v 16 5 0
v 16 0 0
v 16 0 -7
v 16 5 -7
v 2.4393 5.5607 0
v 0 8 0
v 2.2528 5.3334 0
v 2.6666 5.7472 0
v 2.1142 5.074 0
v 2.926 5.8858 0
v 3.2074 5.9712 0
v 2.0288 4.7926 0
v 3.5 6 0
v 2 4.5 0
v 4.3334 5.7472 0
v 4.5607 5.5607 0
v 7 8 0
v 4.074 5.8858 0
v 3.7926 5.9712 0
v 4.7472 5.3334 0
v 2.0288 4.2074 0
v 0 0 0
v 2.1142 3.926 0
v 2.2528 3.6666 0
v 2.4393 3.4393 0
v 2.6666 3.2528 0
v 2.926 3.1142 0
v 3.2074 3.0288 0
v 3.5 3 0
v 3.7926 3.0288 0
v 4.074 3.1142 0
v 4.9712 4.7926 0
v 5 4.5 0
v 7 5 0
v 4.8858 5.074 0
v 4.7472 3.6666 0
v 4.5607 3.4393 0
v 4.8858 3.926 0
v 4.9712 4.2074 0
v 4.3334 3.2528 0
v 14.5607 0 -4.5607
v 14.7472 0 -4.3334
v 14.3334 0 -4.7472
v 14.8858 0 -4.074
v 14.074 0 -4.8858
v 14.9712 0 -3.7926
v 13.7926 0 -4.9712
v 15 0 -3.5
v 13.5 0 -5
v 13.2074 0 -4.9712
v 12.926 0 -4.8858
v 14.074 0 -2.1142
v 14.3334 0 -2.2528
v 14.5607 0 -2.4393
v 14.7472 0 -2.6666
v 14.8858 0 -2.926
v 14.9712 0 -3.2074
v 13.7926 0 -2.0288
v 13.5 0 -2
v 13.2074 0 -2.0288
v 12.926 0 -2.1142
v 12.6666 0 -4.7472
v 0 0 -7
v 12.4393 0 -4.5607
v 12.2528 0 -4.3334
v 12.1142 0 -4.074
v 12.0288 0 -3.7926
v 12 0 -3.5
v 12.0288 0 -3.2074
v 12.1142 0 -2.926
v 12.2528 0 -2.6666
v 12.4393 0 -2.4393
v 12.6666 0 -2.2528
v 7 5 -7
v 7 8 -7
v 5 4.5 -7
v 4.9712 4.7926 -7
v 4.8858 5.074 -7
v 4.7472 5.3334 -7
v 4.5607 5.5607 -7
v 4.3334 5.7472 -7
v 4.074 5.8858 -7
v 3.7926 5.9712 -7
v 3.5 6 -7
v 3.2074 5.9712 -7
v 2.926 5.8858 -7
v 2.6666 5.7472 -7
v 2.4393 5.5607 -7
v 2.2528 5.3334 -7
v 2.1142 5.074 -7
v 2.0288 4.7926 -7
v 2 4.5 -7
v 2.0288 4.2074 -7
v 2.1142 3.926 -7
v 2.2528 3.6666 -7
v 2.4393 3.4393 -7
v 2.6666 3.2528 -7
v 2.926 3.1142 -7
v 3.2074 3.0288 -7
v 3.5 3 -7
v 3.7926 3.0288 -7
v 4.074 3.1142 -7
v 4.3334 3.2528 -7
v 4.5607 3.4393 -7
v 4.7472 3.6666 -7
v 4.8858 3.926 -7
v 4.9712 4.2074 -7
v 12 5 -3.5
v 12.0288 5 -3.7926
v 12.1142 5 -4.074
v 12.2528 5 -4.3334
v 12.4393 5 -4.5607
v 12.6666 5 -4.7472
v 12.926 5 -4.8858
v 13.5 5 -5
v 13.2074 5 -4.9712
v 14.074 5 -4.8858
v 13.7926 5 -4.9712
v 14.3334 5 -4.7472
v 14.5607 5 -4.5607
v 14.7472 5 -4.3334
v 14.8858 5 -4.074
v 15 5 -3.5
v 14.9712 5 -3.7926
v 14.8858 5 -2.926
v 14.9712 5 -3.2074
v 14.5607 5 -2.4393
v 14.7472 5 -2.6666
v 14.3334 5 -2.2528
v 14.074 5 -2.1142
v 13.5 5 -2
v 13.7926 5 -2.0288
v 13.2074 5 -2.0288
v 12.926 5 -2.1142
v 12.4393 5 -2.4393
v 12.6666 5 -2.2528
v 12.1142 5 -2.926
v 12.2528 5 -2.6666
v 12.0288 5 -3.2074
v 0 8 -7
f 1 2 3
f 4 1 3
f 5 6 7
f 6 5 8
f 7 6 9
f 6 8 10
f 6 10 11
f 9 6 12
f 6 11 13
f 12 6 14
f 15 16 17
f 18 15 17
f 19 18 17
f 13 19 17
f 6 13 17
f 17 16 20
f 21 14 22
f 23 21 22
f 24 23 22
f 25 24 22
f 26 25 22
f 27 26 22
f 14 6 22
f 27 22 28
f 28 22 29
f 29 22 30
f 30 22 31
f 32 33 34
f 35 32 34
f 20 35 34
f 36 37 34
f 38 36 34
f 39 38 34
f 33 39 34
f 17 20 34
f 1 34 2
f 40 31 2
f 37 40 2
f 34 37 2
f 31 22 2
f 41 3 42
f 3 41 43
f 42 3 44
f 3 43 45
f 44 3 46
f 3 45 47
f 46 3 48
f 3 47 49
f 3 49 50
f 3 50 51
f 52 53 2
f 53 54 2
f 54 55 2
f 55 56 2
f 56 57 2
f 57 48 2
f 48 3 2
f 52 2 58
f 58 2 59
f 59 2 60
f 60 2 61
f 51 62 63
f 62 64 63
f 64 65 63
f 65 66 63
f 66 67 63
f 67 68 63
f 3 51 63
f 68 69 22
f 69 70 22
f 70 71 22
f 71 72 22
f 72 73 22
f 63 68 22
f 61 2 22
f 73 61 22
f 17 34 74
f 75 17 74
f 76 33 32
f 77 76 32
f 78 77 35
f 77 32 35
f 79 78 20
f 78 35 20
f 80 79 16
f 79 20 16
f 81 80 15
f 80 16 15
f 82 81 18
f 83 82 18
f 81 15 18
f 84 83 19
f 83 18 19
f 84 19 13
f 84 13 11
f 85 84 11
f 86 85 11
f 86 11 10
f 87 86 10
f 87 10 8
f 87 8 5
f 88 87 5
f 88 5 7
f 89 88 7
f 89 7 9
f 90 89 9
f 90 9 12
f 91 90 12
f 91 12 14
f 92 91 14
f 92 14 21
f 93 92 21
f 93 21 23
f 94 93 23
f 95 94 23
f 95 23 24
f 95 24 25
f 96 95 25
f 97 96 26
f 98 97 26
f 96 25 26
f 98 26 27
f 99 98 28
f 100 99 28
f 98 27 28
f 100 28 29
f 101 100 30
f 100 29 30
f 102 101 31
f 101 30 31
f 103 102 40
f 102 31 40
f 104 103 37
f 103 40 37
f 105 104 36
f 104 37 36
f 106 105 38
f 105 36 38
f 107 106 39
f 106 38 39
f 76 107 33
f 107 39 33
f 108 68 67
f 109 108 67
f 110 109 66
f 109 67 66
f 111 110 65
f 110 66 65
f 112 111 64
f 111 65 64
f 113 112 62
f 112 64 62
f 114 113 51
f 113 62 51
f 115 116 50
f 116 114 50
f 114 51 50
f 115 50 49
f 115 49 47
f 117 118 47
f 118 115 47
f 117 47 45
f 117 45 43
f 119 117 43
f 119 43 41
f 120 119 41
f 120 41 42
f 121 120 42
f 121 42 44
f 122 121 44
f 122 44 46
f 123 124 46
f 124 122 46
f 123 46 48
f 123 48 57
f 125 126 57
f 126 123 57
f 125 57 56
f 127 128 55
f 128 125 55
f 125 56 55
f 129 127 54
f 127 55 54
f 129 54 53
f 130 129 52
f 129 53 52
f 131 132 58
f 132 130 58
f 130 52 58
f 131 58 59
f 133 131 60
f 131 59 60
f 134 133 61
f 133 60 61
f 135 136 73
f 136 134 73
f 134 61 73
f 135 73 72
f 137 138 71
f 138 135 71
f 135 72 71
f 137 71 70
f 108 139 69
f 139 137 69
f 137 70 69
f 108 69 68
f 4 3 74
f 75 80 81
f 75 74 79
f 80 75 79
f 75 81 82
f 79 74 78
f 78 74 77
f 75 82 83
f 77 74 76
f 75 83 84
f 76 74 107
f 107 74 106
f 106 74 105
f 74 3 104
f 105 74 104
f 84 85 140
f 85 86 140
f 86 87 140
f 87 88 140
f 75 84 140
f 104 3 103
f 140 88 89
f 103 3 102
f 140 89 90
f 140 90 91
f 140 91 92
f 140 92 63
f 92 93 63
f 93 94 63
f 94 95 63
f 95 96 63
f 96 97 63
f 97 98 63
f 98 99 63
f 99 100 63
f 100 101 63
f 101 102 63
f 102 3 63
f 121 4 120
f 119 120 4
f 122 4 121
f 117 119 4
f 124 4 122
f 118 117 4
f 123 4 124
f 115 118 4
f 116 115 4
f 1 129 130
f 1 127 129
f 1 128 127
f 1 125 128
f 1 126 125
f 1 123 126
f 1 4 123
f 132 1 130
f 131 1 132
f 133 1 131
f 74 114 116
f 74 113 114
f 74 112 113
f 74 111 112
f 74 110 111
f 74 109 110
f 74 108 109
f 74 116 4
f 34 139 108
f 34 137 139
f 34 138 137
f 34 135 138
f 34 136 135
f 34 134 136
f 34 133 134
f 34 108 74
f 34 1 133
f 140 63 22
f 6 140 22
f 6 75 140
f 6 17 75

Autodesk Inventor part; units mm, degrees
ref_plane "YZ Plane" through (0, 0, 0) normal (1, 0, 0) x (0, 1, 0)
ref_plane "XZ Plane" through (0, 0, 0) normal (0, 1, 0) x (-1, 0, 0)
ref_plane "XY Plane" through (0, 0, 0) normal (0, 0, 1) x (1, 0, 0)
sketch "Эскиз1" plane through (0, 0, 0) normal (0, 1, 0) x (-1, 0, 0)
  line L0 (0, 0) -> (-16, 0)
  line L1 (-16, 0) -> (-16, -7)
  line L2 (-16, -7) -> (0, -7)
  line L3 (0, -7) -> (0, 0)
  circle A0 centre (-13.5, -3.5) radius 1.5
  dimension "d0" = 16
  dimension "d1" = 7
  dimension "d2" = 3
  dimension "d3" = 2.5
  dimension "d4" = 3.5
extrude "Выдавливание1" add sketch "Эскиз1" along normal blind 5
sketch "Эскиз2" plane through (0, 0, 0) normal (0, 1, 0) x (-1, 0, 0)
  line L0 (-16, 0) -> (-16, -7) construction
  line L1 (-16, -7) -> (0, -7) construction
  line L2 (0, -7) -> (0, 0) projected
  line L3 (0, 0) -> (-16, 0) construction
  circle A0 centre (-13.5, -3.5) radius 1.5 construction
  line L4 (0, 0) -> (-7, 0)
  line L5 (-7, 0) -> (-7, -7)
  line L6 (-7, -7) -> (0, -7)
  line L7 (0, -7) -> (0, 0)
  point P0 (0, -7)
  dimension "d7" = 7
  dimension "d8" = 7
extrude "Выдавливание2" add sketch "Эскиз2" along normal blind 8
sketch "Эскиз3" plane through (0, 0, 0) normal (0, 0, 1) x (1, 0, 0)
  line L0 (0, 0) -> (16, 0) construction
  line L1 (16, 0) -> (16, 5) construction
  line L2 (7, 5) -> (16, 5) construction
  line L3 (7, 5) -> (7, 8) construction
  line L4 (0, 8) -> (7, 8) construction
  line L5 (0, 0) -> (0, 8) construction
  circle A0 centre (3.5, 4.5) radius 1.5
  dimension "d11" = 3
  dimension "d12" = 3.5
  dimension "d13" = 3.5
extrude "Выдавливание3" cut sketch "Эскиз3" against normal blind 7
properties part number "angle_01"
